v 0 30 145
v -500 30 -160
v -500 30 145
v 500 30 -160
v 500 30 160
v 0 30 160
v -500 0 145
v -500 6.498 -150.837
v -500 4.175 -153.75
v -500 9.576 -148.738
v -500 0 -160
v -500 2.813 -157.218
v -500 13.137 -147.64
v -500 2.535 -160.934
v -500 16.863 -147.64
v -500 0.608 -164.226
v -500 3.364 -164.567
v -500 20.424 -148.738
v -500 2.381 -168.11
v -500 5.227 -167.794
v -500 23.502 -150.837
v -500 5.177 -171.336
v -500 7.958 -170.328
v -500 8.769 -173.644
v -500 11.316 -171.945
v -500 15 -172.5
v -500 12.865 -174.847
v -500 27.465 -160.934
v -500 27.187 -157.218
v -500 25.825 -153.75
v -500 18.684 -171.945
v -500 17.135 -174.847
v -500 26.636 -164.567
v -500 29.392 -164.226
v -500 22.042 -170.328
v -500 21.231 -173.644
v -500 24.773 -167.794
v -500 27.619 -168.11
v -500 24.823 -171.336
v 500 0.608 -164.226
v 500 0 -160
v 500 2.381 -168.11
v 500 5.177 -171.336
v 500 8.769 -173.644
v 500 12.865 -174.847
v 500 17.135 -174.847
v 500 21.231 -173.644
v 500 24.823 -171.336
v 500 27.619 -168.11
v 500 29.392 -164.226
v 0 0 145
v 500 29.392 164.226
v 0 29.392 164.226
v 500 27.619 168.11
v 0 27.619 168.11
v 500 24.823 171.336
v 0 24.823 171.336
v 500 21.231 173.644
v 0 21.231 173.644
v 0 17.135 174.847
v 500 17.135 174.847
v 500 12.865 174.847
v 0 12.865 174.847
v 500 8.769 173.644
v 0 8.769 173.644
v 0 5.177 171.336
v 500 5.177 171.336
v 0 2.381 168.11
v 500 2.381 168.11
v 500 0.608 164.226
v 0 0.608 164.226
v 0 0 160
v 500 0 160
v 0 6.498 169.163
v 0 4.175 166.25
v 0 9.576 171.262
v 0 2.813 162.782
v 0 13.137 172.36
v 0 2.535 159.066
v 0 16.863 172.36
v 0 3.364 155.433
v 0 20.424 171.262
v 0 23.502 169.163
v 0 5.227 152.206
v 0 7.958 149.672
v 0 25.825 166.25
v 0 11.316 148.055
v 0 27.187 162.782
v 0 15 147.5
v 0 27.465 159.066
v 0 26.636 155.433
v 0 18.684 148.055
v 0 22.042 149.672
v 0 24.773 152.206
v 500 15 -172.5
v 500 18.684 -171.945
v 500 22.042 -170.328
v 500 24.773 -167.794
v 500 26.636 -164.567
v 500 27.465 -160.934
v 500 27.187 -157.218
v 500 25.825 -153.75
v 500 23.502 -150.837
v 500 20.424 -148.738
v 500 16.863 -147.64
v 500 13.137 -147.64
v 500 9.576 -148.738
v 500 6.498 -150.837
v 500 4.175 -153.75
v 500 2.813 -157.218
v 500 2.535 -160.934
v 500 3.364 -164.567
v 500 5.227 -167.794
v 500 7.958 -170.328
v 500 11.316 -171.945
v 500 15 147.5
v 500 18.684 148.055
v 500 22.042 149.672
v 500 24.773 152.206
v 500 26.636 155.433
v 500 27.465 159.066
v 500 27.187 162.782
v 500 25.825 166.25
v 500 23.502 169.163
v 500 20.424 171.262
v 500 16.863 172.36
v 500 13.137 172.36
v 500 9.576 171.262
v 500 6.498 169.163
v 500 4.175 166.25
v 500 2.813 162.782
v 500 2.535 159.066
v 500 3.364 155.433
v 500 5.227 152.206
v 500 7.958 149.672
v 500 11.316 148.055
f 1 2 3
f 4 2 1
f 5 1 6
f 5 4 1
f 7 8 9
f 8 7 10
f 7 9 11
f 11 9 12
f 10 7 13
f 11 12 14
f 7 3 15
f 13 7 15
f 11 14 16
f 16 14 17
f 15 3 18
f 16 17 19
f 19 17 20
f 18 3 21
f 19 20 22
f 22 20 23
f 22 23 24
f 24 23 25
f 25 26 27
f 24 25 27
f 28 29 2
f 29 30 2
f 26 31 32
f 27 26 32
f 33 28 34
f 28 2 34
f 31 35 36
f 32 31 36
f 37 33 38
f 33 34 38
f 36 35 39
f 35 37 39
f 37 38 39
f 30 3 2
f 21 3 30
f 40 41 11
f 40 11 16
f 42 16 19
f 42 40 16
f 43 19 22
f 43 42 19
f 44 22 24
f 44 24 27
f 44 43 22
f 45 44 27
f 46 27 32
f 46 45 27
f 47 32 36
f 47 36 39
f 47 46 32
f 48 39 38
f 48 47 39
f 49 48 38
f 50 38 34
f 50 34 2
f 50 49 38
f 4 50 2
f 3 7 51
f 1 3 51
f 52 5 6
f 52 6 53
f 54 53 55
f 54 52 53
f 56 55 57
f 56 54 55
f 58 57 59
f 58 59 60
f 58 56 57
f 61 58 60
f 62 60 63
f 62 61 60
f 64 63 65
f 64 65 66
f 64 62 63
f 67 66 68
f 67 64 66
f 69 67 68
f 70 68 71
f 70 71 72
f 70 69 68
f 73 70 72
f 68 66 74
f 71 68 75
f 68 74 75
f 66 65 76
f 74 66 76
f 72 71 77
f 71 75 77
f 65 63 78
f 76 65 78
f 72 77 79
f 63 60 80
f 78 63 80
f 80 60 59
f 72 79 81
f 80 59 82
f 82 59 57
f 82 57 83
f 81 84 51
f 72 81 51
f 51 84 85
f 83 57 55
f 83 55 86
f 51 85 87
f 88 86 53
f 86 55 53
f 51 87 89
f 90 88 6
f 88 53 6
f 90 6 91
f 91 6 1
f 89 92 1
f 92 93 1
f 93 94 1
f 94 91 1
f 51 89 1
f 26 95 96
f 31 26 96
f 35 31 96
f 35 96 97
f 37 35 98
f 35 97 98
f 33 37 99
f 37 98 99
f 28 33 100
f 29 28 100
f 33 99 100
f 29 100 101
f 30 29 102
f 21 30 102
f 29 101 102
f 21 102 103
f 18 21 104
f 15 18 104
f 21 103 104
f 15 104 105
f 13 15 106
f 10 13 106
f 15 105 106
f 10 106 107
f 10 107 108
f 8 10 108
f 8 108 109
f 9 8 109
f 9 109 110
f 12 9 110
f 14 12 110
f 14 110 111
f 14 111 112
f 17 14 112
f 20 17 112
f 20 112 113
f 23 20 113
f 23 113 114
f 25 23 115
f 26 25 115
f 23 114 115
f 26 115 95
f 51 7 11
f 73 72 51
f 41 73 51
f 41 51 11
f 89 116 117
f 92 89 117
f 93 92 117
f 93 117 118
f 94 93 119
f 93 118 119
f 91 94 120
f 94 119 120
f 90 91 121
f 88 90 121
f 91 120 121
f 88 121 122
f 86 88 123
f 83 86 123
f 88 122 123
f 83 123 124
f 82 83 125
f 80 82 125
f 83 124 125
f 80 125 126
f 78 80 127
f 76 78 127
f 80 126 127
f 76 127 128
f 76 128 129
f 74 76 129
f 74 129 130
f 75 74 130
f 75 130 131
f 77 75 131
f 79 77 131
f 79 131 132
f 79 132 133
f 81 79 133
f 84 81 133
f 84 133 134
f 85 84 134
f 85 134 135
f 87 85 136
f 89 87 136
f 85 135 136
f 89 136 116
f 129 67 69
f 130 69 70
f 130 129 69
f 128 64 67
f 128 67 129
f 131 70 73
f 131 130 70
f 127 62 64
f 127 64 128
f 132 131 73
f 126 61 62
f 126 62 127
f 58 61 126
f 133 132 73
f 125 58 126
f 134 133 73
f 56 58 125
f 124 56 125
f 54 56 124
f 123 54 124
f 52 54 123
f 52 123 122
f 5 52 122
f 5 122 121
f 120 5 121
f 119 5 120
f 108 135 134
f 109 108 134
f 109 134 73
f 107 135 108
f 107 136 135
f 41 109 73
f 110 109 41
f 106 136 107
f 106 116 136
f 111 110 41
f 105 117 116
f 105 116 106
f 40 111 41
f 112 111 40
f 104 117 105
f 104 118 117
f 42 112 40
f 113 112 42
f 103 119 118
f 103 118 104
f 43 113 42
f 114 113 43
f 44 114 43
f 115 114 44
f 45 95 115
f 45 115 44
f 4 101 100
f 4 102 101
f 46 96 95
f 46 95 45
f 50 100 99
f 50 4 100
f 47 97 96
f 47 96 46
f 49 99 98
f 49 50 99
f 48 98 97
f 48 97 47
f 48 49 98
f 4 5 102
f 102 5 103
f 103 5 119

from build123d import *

# Parameters (mm, degrees)
SKETCH1_W           = 1000
SKETCH1_H           = 290
BOSS_EXTRUDE1_DEPTH = 30
SKETCH2_R           = 15
SKETCH2_R_2         = 12.5
BOSS_EXTRUDE2_DEPTH = 500
SKETCH3_R           = 15
SKETCH3_R_2         = 12.5
BOSS_EXTRUDE3_DEPTH = 1000


with BuildPart() as part:
    # Sketch1 → Boss-Extrude1 (new body)
    with BuildSketch(Plane(origin=(0, 0, 0), x_dir=(1, 0, 0), z_dir=(0, 1, 0))):
        Rectangle(SKETCH1_W, SKETCH1_H)
    extrude(amount=BOSS_EXTRUDE1_DEPTH)

    # Sketch2 → Boss-Extrude2 (add)
    with BuildSketch(Plane(origin=(500, 0, 0), x_dir=(0, 0, -1), z_dir=(1, 0, 0))):
        with BuildLine():
            Line((-145, 30), (-160, 30))
            ThreePointArc((-160, 30), (-149.393398282, 25.606601718), (-145, 15))
            Line((-145, 15), (-145, 30))
        make_face()
        with BuildLine():
            Line((-145, 0), (-145, 15))
            ThreePointArc((-145, 15), (-149.393398282, 4.393398282), (-160, 0))
            Line((-160, 0), (-145, 0))
        make_face()
        with Locations((-160, 15)):
            Circle(SKETCH2_R)
        with Locations((-160, 15)):
            Circle(SKETCH2_R_2, mode=Mode.SUBTRACT)
    extrude(amount=-BOSS_EXTRUDE2_DEPTH)

    # Sketch3 → Boss-Extrude3 (add)
    with BuildSketch(Plane(origin=(500, 0, 0), x_dir=(0, 0, -1), z_dir=(1, 0, 0))):
        with BuildLine():
            ThreePointArc((145, 15), (149.393398282, 25.606601718), (160, 30))
            Line((160, 30), (145, 30))
            Line((145, 30), (145, 15))
        make_face()
        with Locations((160, 15)):
            Circle(SKETCH3_R)
        with Locations((160, 15)):
            Circle(SKETCH3_R_2, mode=Mode.SUBTRACT)
        with BuildLine():
            ThreePointArc((160, 0), (149.393398282, 4.393398282), (145, 15))
            Line((145, 15), (145, 0))
            Line((145, 0), (160, 0))
        make_face()
    extrude(amount=-BOSS_EXTRUDE3_DEPTH)


solid = part.part
